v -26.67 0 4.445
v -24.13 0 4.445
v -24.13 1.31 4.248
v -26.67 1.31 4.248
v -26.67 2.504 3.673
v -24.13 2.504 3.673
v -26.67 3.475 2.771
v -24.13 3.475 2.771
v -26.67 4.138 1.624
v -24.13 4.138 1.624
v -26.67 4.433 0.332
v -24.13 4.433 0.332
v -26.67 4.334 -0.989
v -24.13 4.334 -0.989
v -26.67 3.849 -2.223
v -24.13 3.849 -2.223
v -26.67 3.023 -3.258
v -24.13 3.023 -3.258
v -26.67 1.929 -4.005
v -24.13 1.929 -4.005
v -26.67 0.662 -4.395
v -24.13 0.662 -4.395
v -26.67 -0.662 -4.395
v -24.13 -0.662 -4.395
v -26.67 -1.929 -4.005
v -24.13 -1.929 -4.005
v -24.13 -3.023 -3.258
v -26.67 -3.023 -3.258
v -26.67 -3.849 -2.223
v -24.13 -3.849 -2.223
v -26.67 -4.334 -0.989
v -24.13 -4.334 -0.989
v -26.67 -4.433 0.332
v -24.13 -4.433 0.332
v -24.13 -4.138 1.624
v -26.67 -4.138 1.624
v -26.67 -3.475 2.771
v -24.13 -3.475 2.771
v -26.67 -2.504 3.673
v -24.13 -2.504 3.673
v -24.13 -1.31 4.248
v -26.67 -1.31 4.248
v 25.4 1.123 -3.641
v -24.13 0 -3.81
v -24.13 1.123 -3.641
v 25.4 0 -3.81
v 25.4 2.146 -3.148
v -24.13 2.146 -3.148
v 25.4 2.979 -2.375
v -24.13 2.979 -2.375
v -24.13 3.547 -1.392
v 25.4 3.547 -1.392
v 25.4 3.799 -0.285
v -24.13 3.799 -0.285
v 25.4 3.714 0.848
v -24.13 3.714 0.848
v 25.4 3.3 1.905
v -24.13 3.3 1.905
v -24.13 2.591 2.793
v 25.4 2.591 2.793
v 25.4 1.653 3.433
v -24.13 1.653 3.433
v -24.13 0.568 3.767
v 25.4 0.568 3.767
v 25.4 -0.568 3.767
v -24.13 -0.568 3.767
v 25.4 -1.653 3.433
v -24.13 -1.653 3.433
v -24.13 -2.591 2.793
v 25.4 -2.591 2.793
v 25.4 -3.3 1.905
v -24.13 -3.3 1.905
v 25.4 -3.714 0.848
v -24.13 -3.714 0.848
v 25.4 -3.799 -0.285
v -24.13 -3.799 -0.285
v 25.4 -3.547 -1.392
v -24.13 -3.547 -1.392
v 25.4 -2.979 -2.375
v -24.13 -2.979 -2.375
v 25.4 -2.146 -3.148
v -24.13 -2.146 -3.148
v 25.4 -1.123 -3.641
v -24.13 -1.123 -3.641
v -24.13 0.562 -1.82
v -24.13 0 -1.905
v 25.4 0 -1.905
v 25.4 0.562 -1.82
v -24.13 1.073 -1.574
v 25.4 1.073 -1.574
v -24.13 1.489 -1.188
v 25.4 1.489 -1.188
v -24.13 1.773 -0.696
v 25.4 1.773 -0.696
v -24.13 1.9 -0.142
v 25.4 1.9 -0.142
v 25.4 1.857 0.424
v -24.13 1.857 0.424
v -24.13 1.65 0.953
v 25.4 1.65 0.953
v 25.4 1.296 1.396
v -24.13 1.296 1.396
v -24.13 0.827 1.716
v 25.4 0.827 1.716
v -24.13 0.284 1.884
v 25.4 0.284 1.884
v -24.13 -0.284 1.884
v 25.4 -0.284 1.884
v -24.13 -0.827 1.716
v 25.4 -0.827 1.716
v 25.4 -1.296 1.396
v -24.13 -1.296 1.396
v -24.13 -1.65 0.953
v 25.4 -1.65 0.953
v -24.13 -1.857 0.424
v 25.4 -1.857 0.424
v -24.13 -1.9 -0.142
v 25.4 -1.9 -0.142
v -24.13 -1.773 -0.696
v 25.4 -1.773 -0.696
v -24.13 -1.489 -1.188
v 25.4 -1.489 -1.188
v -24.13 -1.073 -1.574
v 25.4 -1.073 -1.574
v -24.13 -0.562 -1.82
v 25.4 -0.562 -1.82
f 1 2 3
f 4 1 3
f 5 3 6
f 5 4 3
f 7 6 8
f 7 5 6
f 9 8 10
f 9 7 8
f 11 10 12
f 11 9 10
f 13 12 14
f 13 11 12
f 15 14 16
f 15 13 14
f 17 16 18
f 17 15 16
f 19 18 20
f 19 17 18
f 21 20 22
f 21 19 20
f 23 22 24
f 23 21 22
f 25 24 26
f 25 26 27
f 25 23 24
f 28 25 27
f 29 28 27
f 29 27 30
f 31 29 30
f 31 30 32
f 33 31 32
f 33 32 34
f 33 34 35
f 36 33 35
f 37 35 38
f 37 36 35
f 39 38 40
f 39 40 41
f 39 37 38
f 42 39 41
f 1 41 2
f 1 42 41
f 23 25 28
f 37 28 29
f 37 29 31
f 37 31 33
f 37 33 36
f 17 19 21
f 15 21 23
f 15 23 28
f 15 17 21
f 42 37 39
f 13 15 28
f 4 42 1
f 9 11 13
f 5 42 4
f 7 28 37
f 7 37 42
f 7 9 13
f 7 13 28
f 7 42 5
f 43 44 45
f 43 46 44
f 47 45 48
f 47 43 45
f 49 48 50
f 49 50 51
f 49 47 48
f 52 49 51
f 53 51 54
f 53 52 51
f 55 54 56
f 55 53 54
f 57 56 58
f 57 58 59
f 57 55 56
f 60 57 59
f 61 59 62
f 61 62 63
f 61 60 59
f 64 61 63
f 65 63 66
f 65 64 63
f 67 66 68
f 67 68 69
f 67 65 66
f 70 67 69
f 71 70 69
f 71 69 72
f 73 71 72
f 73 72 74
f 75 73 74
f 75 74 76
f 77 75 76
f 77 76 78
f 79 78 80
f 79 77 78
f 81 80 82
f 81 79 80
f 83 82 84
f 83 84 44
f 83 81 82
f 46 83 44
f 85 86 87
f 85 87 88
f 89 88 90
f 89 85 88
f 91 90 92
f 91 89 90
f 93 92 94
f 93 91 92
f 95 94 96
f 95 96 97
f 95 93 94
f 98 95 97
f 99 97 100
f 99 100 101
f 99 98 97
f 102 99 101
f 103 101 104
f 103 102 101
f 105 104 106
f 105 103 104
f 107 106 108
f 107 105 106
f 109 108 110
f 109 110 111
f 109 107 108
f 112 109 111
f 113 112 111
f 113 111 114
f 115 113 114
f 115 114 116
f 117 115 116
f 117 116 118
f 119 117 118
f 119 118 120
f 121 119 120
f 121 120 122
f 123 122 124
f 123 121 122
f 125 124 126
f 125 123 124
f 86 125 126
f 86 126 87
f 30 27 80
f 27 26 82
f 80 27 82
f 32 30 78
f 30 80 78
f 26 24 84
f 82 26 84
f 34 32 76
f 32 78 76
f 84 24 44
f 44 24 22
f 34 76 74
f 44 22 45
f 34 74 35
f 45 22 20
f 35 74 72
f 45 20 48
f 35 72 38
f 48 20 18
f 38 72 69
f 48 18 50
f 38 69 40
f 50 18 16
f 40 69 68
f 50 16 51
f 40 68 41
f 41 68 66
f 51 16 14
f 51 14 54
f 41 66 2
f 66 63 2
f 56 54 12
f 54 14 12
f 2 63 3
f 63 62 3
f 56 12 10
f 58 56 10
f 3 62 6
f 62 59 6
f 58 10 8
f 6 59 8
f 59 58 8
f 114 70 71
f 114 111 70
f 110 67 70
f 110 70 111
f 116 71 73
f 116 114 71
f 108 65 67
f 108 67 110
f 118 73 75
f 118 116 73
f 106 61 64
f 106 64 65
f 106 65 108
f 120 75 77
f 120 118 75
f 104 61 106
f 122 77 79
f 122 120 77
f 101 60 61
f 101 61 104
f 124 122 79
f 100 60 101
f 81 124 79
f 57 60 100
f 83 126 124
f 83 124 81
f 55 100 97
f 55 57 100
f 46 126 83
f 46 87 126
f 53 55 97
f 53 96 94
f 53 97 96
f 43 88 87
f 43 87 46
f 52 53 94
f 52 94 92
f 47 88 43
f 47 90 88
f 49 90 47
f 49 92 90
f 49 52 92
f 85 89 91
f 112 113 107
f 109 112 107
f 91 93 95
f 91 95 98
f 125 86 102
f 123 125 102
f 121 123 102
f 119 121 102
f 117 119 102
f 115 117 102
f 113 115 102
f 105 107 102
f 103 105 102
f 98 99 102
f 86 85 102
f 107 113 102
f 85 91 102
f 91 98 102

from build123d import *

# Parameters (mm, degrees)
SKETCH1_R           = 3.81
SKETCH1_R_2         = 1.905
BOSS_EXTRUDE1_DEPTH = 25.4
SKETCH2_R           = 4.445
BOSS_EXTRUDE2_DEPTH = 1.27


with BuildPart() as part:
    # Sketch1 → Boss-Extrude1 (new, symmetric)
    with BuildSketch(Plane(origin=(0, 0, 0), x_dir=(0, 0, -1), z_dir=(1, 0, 0))):
        Circle(SKETCH1_R)
        Circle(SKETCH1_R_2, mode=Mode.SUBTRACT)
    extrude(amount=BOSS_EXTRUDE1_DEPTH, both=True)

    # Sketch2 → Boss-Extrude2 (add, symmetric)
    with BuildSketch(Plane.ZY.offset(25.4)):
        Circle(SKETCH2_R)
    extrude(amount=BOSS_EXTRUDE2_DEPTH, both=True)


solid = part.part
